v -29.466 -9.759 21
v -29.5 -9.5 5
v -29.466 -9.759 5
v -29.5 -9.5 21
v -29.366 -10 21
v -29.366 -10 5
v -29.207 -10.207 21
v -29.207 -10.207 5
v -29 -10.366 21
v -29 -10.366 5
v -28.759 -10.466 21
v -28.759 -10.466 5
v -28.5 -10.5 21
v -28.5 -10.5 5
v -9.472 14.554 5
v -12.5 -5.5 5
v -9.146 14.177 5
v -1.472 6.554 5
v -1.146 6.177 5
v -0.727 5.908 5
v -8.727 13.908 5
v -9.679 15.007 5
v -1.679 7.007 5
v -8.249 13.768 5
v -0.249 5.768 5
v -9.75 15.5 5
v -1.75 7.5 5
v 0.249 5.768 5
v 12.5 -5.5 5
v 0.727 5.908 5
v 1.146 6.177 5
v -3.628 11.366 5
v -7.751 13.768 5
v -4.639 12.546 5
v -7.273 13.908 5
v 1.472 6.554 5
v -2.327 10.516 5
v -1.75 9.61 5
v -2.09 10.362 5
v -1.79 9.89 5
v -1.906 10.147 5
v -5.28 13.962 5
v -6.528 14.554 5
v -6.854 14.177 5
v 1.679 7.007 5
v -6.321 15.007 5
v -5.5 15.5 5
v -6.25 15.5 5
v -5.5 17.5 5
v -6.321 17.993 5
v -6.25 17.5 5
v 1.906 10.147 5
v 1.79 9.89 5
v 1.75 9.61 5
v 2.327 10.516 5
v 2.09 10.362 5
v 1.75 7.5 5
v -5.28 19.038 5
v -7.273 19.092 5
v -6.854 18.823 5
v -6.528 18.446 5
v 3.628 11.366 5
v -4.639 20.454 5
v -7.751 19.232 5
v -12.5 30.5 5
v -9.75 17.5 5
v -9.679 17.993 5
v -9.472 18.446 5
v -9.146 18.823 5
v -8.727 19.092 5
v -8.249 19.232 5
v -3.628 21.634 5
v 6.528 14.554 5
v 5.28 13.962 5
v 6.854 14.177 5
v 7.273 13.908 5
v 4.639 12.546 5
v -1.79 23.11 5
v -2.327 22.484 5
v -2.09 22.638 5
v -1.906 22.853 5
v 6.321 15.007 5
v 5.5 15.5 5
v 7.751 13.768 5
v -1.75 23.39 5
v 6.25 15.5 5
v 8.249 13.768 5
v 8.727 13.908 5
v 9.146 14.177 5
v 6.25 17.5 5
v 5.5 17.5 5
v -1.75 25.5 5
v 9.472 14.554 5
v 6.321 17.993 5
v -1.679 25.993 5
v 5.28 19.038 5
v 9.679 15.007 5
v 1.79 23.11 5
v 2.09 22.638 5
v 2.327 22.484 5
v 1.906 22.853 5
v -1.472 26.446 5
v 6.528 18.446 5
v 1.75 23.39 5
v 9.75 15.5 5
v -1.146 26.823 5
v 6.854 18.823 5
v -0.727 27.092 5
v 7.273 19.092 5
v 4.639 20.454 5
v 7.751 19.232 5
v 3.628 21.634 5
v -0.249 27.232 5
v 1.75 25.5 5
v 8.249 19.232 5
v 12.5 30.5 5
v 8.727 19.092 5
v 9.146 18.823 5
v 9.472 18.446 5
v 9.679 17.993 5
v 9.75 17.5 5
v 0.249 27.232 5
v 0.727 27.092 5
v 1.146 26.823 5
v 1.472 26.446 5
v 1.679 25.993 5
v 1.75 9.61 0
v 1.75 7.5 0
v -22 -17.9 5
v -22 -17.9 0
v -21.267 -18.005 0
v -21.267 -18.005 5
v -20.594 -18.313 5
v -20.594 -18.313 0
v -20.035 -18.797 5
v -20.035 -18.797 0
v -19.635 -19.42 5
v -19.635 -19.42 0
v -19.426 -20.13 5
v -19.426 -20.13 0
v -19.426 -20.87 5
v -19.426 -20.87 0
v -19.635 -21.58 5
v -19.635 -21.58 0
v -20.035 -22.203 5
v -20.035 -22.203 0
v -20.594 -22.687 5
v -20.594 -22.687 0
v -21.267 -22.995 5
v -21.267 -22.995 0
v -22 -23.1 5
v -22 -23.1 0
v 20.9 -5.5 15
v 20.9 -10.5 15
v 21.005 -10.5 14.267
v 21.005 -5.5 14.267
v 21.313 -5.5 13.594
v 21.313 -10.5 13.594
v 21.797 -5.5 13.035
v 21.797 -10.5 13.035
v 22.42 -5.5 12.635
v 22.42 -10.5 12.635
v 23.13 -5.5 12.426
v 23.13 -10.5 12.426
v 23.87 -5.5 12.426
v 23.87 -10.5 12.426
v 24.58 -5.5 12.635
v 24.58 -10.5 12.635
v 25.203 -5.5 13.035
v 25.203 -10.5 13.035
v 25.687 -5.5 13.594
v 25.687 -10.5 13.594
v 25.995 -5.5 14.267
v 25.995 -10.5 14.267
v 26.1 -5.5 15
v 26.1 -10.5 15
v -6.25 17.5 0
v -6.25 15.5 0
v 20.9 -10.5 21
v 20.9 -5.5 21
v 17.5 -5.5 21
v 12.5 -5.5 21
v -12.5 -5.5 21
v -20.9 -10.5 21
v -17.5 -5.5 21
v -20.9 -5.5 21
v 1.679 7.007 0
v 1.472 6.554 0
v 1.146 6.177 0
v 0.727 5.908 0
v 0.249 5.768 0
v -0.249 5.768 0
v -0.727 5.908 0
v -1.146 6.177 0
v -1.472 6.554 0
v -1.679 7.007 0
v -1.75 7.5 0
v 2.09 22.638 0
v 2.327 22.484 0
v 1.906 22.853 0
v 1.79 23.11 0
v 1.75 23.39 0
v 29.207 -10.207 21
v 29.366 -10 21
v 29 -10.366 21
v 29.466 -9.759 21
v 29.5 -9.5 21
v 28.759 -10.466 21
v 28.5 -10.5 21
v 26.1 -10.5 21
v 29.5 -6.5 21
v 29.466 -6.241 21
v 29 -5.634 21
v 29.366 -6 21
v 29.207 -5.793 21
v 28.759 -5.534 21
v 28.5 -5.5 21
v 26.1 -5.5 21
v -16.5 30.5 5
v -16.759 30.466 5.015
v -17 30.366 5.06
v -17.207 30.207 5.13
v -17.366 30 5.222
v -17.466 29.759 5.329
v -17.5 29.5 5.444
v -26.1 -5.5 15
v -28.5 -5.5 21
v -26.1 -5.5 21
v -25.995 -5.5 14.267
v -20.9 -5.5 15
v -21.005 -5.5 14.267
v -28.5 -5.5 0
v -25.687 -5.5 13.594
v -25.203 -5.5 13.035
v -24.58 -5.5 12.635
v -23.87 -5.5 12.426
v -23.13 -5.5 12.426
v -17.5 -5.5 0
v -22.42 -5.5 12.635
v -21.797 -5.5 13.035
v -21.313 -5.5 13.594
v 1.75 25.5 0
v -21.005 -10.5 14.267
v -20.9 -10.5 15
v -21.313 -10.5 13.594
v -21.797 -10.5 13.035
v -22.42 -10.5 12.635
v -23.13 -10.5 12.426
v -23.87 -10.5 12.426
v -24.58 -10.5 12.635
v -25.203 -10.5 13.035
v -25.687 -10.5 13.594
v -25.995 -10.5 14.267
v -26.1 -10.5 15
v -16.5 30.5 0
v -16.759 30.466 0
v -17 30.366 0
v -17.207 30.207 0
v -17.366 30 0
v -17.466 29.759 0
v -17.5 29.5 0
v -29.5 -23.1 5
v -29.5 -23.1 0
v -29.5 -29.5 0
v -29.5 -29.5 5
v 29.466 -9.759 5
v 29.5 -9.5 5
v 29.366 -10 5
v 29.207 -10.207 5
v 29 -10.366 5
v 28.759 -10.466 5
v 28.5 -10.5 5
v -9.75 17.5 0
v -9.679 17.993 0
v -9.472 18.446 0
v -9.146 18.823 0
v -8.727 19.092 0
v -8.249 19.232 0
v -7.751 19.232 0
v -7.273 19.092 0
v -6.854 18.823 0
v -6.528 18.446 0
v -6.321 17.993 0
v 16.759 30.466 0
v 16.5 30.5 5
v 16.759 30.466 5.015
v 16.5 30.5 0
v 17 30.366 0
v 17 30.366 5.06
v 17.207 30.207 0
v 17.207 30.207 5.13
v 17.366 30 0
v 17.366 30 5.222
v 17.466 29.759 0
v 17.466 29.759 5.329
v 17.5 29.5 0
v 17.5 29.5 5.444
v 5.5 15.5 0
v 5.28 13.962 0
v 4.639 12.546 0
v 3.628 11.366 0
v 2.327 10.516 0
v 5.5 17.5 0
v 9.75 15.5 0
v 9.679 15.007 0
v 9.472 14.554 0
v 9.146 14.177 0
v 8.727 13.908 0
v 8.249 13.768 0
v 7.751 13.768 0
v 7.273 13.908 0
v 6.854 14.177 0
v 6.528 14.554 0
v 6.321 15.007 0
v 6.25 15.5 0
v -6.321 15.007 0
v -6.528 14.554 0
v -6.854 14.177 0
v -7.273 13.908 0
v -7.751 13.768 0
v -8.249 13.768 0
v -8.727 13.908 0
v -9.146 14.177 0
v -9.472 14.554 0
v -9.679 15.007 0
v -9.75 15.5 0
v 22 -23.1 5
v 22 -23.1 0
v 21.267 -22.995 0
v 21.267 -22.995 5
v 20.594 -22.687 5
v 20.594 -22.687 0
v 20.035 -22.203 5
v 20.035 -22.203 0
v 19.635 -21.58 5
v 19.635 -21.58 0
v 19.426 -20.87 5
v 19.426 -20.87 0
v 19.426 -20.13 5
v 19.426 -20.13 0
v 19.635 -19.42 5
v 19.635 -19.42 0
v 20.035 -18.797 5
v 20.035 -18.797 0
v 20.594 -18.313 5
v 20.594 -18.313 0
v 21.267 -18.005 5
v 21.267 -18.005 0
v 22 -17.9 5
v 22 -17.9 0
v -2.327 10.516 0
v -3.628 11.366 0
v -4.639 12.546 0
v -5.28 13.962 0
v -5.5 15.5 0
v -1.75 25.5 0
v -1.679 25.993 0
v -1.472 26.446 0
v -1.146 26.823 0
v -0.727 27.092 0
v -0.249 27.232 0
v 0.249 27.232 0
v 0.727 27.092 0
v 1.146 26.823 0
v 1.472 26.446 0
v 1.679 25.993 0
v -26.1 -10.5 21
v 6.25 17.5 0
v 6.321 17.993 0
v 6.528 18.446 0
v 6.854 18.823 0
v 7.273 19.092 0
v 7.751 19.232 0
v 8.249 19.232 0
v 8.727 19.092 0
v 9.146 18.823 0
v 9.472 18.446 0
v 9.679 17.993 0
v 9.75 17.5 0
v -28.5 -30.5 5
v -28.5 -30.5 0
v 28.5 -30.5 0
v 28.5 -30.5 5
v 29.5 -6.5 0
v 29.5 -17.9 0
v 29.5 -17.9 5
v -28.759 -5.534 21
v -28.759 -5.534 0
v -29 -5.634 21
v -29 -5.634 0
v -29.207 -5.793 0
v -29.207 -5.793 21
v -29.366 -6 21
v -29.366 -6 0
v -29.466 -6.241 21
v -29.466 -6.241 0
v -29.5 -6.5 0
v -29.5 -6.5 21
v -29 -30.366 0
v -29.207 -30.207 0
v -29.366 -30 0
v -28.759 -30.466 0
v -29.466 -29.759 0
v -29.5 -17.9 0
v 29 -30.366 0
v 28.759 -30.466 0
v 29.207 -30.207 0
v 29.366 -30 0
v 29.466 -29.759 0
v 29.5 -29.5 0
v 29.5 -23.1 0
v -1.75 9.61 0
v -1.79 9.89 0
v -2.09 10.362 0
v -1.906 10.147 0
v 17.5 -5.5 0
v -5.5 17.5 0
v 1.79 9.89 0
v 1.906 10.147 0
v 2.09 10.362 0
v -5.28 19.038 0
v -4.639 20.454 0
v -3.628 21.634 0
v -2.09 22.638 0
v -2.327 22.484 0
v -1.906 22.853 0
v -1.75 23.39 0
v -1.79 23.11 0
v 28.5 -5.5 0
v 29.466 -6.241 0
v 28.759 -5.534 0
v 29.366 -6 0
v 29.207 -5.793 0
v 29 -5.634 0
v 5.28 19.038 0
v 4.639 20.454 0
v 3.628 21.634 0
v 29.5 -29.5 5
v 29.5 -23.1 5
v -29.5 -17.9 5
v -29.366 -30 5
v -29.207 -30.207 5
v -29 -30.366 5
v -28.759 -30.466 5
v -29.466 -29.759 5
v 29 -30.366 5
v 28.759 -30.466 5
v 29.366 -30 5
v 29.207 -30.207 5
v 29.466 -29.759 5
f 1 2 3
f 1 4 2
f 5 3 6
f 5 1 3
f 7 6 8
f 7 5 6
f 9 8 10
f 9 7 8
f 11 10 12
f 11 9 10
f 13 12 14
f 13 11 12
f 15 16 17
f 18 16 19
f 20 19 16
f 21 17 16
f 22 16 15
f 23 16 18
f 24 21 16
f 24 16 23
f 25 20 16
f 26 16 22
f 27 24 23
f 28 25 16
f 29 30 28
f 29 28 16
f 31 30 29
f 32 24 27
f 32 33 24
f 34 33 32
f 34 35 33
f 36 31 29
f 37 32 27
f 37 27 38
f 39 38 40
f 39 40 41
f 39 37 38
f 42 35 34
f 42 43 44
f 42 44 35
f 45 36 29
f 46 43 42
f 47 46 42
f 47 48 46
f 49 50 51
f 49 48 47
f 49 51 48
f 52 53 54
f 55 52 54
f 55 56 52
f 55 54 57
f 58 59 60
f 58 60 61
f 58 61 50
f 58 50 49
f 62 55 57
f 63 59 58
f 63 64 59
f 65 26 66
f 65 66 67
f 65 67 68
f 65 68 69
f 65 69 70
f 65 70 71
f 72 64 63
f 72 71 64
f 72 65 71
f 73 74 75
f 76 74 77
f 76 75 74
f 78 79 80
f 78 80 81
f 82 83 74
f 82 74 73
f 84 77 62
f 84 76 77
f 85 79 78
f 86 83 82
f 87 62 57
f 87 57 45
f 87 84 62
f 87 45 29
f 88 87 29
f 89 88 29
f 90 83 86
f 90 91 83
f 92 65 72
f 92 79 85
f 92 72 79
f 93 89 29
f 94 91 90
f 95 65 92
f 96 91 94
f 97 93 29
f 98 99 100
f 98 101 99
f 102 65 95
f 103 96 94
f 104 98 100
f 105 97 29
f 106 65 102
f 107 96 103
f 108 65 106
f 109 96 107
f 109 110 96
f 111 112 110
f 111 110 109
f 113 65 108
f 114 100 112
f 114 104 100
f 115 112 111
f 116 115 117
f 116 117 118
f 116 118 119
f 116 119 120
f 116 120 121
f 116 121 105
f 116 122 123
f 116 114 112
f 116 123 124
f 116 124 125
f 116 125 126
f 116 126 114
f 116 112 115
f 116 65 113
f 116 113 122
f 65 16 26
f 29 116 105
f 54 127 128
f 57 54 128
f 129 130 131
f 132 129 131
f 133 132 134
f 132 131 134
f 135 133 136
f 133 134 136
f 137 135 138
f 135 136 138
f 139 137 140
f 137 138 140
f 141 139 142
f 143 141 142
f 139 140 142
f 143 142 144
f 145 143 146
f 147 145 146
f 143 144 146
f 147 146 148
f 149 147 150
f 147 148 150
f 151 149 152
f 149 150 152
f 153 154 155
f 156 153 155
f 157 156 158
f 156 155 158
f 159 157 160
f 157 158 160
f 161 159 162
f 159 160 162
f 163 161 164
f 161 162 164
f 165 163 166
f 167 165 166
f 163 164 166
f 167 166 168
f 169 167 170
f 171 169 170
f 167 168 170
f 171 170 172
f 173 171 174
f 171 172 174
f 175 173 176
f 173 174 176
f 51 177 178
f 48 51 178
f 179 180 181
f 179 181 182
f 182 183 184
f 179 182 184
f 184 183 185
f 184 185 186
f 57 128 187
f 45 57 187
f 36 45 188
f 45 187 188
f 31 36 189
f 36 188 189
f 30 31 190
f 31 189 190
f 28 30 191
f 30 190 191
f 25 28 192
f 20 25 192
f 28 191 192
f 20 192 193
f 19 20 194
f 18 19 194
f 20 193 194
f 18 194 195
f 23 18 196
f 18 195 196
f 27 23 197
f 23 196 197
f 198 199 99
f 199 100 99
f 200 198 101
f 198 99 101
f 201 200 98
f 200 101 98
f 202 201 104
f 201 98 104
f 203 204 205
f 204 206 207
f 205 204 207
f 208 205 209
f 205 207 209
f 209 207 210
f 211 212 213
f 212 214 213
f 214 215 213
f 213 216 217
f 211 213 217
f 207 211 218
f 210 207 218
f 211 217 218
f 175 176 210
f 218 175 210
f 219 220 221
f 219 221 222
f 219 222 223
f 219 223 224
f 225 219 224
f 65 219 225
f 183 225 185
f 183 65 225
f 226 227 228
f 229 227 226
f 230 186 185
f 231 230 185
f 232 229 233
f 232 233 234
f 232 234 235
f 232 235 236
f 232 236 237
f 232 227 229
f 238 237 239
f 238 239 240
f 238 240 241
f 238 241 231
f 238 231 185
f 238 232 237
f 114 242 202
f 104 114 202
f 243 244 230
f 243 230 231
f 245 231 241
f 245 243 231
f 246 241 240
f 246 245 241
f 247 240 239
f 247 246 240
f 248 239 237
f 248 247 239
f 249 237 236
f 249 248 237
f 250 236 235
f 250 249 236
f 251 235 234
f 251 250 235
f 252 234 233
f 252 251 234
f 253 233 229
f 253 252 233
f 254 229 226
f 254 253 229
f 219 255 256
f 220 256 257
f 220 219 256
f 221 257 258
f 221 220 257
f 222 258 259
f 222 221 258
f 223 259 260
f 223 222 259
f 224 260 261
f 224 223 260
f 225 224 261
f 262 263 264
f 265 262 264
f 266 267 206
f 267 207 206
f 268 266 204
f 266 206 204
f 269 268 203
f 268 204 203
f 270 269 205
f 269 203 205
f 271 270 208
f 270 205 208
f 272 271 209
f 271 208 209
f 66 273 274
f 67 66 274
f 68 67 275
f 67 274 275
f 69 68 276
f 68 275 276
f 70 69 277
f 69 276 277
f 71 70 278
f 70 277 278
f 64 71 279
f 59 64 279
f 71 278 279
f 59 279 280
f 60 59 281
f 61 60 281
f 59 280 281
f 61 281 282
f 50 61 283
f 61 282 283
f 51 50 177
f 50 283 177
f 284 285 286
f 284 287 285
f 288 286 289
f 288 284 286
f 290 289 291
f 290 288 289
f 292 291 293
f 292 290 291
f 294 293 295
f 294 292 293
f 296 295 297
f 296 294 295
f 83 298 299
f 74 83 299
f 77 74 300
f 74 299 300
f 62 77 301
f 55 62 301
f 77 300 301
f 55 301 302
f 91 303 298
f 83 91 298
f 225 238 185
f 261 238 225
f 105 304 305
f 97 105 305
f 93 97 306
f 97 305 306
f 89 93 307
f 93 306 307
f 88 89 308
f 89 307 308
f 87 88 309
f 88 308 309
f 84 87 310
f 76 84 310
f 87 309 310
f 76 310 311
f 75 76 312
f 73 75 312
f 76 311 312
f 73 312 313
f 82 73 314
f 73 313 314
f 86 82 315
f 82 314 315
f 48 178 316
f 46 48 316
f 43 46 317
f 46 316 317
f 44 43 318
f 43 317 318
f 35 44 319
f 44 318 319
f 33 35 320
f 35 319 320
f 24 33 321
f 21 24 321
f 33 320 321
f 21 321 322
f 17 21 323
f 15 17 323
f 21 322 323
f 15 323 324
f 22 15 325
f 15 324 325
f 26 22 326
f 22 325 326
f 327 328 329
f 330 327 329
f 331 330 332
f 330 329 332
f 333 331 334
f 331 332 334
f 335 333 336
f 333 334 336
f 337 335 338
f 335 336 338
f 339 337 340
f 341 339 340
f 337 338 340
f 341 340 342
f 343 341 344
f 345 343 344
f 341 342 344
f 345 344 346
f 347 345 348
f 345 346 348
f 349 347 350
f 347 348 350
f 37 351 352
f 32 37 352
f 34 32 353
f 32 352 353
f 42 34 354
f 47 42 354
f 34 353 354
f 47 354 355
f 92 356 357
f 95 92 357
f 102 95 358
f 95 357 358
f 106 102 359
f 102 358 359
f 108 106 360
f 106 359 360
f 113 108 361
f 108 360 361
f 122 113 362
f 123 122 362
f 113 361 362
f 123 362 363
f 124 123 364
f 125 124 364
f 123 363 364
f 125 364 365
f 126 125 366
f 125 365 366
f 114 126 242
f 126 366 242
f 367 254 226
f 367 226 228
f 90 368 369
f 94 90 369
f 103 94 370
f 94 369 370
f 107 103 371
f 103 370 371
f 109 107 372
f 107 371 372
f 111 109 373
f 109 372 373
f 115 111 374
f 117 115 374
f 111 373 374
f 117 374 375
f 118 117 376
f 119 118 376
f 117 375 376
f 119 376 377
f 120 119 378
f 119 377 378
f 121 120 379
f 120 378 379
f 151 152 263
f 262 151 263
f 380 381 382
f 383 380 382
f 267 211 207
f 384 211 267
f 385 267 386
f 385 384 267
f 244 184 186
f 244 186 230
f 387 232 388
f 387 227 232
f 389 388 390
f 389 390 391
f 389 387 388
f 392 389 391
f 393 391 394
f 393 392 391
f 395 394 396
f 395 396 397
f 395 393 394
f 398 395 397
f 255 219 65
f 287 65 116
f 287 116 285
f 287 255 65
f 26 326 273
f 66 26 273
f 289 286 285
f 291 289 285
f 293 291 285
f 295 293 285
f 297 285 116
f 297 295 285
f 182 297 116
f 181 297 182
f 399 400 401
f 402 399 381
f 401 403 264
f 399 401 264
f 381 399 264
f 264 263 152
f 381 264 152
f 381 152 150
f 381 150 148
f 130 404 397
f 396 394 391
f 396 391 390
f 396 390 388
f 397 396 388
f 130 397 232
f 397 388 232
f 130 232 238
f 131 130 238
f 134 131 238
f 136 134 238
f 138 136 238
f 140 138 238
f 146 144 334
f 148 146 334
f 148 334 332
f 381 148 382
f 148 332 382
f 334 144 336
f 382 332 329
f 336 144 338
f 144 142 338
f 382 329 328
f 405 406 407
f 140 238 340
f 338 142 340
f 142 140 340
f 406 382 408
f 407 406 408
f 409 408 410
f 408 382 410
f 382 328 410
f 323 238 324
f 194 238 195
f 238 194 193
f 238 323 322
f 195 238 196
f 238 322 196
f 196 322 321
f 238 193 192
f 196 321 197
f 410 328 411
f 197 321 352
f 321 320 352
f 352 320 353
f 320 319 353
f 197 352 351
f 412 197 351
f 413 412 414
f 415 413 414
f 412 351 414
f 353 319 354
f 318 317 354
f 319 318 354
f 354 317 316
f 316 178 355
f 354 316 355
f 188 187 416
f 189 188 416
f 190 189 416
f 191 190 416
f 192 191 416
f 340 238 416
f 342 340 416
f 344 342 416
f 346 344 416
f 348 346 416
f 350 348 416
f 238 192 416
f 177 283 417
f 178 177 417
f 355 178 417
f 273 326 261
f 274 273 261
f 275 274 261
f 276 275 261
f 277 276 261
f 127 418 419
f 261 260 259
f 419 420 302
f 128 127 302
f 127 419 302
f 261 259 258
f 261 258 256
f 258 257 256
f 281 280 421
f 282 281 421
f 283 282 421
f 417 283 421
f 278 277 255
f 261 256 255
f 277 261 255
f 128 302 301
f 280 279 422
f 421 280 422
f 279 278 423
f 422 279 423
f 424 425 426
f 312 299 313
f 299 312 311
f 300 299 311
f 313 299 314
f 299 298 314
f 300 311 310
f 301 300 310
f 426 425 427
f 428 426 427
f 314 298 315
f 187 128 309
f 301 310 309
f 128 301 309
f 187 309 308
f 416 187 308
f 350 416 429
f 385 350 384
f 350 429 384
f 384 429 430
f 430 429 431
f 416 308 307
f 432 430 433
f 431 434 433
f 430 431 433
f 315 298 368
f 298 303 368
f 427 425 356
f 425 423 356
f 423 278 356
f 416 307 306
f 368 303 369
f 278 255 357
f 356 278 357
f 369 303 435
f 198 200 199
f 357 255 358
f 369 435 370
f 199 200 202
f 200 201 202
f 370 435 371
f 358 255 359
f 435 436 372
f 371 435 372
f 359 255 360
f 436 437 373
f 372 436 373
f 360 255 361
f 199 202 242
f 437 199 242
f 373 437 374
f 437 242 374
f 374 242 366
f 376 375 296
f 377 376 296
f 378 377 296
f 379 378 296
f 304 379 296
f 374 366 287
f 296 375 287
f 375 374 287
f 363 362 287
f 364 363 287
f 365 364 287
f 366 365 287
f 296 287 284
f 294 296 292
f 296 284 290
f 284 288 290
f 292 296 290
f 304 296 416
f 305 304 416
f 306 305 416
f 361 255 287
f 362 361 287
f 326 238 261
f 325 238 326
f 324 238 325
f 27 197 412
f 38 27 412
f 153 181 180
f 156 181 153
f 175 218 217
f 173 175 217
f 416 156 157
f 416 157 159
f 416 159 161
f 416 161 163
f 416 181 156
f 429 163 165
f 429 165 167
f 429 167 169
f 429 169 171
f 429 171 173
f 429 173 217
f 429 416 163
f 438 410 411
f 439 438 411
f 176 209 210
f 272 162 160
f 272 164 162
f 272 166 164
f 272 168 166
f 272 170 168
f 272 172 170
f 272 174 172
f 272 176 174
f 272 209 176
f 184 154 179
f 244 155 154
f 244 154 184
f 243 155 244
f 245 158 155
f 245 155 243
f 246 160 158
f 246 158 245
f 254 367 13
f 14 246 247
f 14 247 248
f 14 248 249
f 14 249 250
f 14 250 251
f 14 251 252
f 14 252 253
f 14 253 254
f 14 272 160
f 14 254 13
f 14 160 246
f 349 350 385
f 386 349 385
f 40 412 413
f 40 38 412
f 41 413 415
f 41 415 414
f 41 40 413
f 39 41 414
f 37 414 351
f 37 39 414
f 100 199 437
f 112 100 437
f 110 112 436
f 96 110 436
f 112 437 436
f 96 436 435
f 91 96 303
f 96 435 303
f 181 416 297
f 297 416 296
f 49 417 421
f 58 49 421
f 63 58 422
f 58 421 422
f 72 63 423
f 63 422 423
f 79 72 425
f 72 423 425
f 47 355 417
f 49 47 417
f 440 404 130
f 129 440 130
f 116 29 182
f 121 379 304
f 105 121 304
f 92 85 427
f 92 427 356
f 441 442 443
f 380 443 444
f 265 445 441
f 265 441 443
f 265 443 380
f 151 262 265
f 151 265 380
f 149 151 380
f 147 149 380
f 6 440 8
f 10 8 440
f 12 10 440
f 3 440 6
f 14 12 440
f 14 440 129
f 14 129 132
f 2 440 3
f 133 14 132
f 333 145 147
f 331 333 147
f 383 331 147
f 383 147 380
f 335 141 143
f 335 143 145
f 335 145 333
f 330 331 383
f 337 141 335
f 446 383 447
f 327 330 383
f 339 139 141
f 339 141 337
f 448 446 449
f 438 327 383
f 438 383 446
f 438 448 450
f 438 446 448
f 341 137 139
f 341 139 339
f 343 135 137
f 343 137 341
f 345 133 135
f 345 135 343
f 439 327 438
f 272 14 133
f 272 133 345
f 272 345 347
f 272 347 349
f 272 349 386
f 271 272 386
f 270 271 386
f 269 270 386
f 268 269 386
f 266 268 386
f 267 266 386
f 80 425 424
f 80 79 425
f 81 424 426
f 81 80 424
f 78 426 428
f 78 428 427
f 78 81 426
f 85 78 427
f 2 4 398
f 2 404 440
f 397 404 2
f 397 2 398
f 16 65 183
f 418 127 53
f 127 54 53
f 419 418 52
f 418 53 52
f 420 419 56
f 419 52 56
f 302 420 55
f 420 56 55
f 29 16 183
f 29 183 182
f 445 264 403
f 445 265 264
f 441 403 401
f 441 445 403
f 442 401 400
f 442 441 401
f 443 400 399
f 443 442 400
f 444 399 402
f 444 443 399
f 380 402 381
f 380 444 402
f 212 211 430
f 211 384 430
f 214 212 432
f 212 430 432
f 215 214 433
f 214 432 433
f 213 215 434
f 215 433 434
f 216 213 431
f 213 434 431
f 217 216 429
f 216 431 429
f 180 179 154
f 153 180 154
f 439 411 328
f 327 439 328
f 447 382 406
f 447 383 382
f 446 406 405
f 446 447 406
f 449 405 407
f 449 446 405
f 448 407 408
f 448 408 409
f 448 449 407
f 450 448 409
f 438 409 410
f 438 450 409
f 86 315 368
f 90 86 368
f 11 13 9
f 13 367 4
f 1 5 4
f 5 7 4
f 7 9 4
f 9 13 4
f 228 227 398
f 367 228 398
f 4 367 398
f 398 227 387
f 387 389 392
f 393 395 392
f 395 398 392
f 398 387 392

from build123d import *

# Parameters (mm, degrees)
BOSS_EXTRUDE1_DEPTH = 5
BOSS_EXTRUDE2_DEPTH = 16
CUT_EXTRUDE1_DEPTH  = 60.835190315
CUT_EXTRUDE2_DEPTH  = 16
FILLET1_R           = 1
FILLET2_R           = 1


with BuildPart() as part:
    # Sketch1 → Boss-Extrude1 (new body)
    with BuildSketch(Plane.XY):
        with BuildLine():
            Line((-29.5, -23.1), (-29.5, -30.5))
            Line((-29.5, -30.5), (29.5, -30.5))
            Line((29.5, -30.5), (29.5, -23.1))
            Line((29.5, -23.1), (22, -23.1))
            ThreePointArc((22, -23.1), (19.4, -20.5), (22, -17.9))
            Line((22, -17.9), (29.5, -17.9))
            Line((29.5, -17.9), (29.5, -5.5))
            Line((29.5, -5.5), (17.5, -5.5))
            Line((17.5, -5.5), (17.5, 30.5))
            Line((17.5, 30.5), (-17.5, 30.5))
            Line((-17.5, 30.5), (-17.5, -5.5))
            Line((-17.5, -5.5), (-29.5, -5.5))
            Line((-29.5, -5.5), (-29.5, -17.9))
            Line((-29.5, -17.9), (-22, -17.9))
            ThreePointArc((-22, -17.9), (-19.4, -20.5), (-22, -23.1))
            Line((-22, -23.1), (-29.5, -23.1))
        make_face()
        with BuildLine():
            ThreePointArc((-9.75, 17.5), (-8, 19.25), (-6.25, 17.5))
            Line((-6.25, 17.5), (-6.25, 15.5))
            ThreePointArc((-6.25, 15.5), (-8, 13.75), (-9.75, 15.5))
            Line((-9.75, 15.5), (-9.75, 17.5))
        make_face(mode=Mode.SUBTRACT)
        with BuildLine():
            ThreePointArc((-1.75, 25.5), (0, 27.25), (1.75, 25.5))
            Line((1.75, 25.5), (1.75, 22.714163404))
            ThreePointArc((1.75, 22.714163404), (4.465142775, 20.711308145), (5.5, 17.5))
            Line((5.5, 17.5), (5.5, 15.5))
            ThreePointArc((5.5, 15.5), (4.465142775, 12.288691855), (1.75, 10.285836596))
            Line((1.75, 10.285836596), (1.75, 7.5))
            ThreePointArc((1.75, 7.5), (0, 5.75), (-1.75, 7.5))
            Line((-1.75, 7.5), (-1.75, 10.285836596))
            ThreePointArc((-1.75, 10.285836596), (-4.465142775, 12.288691855), (-5.5, 15.5))
            Line((-5.5, 15.5), (-5.5, 17.5))
            ThreePointArc((-5.5, 17.5), (-4.465142775, 20.711308145), (-1.75, 22.714163404))
            Line((-1.75, 22.714163404), (-1.75, 25.5))
        make_face(mode=Mode.SUBTRACT)
        with BuildLine():
            Line((6.25, 15.5), (6.25, 17.5))
            ThreePointArc((6.25, 17.5), (8, 19.25), (9.75, 17.5))
            Line((9.75, 17.5), (9.75, 15.5))
            ThreePointArc((9.75, 15.5), (8, 13.75), (6.25, 15.5))
        make_face(mode=Mode.SUBTRACT)
    extrude(amount=BOSS_EXTRUDE1_DEPTH)

    # Sketch2 → Boss-Extrude2 (add)
    with BuildSketch(Plane.XY.offset(5)):
        Polygon((-17.5, 30.5), (-12.5, 30.5), (-12.5, -5.5), (12.5, -5.5), (12.5, 30.5), (17.5, 30.5), (17.5, -5.5), (29.5, -5.5), (29.5, -10.5), (-29.5, -10.5), (-29.5, -5.5), (-17.5, -5.5), align=None)
    extrude(amount=BOSS_EXTRUDE2_DEPTH)

    # Sketch3 → Cut-Extrude1 (cut, through all)
    with BuildSketch(Plane(origin=(17.5, 0, 0), x_dir=(0, 0, -1), z_dir=(1, 0, 0))):
        Polygon((-21, -5.5), (-21, 30.5), (-5, 30.5), align=None)
    extrude(amount=-CUT_EXTRUDE1_DEPTH, mode=Mode.SUBTRACT)

    # Sketch4 → Cut-Extrude2 (cut)
    with BuildSketch(Plane.XZ.offset(10.5)):
        with BuildLine():
            Line((-26.1, 15), (-26.1, 21))
            Line((-26.1, 21), (-20.9, 21))
            Line((-20.9, 21), (-20.9, 15))
            ThreePointArc((-20.9, 15), (-23.5, 12.4), (-26.1, 15))
        make_face()
        with BuildLine():
            Line((20.9, 21), (20.9, 15))
            ThreePointArc((20.9, 15), (23.5, 12.4), (26.1, 15))
            Line((26.1, 15), (26.1, 21))
            Line((26.1, 21), (20.9, 21))
        make_face()
    extrude(amount=-CUT_EXTRUDE2_DEPTH, mode=Mode.SUBTRACT)

    # Fillet1
    fillet1_edges = [part.edges().sort_by_distance(p)[0] for p in [
        (-29.5, -10.5, 13),
        (29.5, -10.5, 13),
        (-17.5, 30.5, 2.5),
        (17.5, 30.5, 2.5),
        (29.5, -30.5, 2.5),
        (-29.5, -30.5, 2.5),
        (-29.5, -5.5, 10.5),
        (29.5, -5.5, 10.5),
    ]]
    fillet(fillet1_edges, radius=FILLET1_R)

    # Fillet2
    fillet2_edges = [part.edges().sort_by_distance(p)[0] for p in [
        (-1.75, 10.285836596, 2.5),
        (1.75, 10.285836596, 2.5),
        (1.75, 22.714163404, 2.5),
        (-1.75, 22.714163404, 2.5),
    ]]
    fillet(fillet2_edges, radius=FILLET2_R)


solid = part.part
